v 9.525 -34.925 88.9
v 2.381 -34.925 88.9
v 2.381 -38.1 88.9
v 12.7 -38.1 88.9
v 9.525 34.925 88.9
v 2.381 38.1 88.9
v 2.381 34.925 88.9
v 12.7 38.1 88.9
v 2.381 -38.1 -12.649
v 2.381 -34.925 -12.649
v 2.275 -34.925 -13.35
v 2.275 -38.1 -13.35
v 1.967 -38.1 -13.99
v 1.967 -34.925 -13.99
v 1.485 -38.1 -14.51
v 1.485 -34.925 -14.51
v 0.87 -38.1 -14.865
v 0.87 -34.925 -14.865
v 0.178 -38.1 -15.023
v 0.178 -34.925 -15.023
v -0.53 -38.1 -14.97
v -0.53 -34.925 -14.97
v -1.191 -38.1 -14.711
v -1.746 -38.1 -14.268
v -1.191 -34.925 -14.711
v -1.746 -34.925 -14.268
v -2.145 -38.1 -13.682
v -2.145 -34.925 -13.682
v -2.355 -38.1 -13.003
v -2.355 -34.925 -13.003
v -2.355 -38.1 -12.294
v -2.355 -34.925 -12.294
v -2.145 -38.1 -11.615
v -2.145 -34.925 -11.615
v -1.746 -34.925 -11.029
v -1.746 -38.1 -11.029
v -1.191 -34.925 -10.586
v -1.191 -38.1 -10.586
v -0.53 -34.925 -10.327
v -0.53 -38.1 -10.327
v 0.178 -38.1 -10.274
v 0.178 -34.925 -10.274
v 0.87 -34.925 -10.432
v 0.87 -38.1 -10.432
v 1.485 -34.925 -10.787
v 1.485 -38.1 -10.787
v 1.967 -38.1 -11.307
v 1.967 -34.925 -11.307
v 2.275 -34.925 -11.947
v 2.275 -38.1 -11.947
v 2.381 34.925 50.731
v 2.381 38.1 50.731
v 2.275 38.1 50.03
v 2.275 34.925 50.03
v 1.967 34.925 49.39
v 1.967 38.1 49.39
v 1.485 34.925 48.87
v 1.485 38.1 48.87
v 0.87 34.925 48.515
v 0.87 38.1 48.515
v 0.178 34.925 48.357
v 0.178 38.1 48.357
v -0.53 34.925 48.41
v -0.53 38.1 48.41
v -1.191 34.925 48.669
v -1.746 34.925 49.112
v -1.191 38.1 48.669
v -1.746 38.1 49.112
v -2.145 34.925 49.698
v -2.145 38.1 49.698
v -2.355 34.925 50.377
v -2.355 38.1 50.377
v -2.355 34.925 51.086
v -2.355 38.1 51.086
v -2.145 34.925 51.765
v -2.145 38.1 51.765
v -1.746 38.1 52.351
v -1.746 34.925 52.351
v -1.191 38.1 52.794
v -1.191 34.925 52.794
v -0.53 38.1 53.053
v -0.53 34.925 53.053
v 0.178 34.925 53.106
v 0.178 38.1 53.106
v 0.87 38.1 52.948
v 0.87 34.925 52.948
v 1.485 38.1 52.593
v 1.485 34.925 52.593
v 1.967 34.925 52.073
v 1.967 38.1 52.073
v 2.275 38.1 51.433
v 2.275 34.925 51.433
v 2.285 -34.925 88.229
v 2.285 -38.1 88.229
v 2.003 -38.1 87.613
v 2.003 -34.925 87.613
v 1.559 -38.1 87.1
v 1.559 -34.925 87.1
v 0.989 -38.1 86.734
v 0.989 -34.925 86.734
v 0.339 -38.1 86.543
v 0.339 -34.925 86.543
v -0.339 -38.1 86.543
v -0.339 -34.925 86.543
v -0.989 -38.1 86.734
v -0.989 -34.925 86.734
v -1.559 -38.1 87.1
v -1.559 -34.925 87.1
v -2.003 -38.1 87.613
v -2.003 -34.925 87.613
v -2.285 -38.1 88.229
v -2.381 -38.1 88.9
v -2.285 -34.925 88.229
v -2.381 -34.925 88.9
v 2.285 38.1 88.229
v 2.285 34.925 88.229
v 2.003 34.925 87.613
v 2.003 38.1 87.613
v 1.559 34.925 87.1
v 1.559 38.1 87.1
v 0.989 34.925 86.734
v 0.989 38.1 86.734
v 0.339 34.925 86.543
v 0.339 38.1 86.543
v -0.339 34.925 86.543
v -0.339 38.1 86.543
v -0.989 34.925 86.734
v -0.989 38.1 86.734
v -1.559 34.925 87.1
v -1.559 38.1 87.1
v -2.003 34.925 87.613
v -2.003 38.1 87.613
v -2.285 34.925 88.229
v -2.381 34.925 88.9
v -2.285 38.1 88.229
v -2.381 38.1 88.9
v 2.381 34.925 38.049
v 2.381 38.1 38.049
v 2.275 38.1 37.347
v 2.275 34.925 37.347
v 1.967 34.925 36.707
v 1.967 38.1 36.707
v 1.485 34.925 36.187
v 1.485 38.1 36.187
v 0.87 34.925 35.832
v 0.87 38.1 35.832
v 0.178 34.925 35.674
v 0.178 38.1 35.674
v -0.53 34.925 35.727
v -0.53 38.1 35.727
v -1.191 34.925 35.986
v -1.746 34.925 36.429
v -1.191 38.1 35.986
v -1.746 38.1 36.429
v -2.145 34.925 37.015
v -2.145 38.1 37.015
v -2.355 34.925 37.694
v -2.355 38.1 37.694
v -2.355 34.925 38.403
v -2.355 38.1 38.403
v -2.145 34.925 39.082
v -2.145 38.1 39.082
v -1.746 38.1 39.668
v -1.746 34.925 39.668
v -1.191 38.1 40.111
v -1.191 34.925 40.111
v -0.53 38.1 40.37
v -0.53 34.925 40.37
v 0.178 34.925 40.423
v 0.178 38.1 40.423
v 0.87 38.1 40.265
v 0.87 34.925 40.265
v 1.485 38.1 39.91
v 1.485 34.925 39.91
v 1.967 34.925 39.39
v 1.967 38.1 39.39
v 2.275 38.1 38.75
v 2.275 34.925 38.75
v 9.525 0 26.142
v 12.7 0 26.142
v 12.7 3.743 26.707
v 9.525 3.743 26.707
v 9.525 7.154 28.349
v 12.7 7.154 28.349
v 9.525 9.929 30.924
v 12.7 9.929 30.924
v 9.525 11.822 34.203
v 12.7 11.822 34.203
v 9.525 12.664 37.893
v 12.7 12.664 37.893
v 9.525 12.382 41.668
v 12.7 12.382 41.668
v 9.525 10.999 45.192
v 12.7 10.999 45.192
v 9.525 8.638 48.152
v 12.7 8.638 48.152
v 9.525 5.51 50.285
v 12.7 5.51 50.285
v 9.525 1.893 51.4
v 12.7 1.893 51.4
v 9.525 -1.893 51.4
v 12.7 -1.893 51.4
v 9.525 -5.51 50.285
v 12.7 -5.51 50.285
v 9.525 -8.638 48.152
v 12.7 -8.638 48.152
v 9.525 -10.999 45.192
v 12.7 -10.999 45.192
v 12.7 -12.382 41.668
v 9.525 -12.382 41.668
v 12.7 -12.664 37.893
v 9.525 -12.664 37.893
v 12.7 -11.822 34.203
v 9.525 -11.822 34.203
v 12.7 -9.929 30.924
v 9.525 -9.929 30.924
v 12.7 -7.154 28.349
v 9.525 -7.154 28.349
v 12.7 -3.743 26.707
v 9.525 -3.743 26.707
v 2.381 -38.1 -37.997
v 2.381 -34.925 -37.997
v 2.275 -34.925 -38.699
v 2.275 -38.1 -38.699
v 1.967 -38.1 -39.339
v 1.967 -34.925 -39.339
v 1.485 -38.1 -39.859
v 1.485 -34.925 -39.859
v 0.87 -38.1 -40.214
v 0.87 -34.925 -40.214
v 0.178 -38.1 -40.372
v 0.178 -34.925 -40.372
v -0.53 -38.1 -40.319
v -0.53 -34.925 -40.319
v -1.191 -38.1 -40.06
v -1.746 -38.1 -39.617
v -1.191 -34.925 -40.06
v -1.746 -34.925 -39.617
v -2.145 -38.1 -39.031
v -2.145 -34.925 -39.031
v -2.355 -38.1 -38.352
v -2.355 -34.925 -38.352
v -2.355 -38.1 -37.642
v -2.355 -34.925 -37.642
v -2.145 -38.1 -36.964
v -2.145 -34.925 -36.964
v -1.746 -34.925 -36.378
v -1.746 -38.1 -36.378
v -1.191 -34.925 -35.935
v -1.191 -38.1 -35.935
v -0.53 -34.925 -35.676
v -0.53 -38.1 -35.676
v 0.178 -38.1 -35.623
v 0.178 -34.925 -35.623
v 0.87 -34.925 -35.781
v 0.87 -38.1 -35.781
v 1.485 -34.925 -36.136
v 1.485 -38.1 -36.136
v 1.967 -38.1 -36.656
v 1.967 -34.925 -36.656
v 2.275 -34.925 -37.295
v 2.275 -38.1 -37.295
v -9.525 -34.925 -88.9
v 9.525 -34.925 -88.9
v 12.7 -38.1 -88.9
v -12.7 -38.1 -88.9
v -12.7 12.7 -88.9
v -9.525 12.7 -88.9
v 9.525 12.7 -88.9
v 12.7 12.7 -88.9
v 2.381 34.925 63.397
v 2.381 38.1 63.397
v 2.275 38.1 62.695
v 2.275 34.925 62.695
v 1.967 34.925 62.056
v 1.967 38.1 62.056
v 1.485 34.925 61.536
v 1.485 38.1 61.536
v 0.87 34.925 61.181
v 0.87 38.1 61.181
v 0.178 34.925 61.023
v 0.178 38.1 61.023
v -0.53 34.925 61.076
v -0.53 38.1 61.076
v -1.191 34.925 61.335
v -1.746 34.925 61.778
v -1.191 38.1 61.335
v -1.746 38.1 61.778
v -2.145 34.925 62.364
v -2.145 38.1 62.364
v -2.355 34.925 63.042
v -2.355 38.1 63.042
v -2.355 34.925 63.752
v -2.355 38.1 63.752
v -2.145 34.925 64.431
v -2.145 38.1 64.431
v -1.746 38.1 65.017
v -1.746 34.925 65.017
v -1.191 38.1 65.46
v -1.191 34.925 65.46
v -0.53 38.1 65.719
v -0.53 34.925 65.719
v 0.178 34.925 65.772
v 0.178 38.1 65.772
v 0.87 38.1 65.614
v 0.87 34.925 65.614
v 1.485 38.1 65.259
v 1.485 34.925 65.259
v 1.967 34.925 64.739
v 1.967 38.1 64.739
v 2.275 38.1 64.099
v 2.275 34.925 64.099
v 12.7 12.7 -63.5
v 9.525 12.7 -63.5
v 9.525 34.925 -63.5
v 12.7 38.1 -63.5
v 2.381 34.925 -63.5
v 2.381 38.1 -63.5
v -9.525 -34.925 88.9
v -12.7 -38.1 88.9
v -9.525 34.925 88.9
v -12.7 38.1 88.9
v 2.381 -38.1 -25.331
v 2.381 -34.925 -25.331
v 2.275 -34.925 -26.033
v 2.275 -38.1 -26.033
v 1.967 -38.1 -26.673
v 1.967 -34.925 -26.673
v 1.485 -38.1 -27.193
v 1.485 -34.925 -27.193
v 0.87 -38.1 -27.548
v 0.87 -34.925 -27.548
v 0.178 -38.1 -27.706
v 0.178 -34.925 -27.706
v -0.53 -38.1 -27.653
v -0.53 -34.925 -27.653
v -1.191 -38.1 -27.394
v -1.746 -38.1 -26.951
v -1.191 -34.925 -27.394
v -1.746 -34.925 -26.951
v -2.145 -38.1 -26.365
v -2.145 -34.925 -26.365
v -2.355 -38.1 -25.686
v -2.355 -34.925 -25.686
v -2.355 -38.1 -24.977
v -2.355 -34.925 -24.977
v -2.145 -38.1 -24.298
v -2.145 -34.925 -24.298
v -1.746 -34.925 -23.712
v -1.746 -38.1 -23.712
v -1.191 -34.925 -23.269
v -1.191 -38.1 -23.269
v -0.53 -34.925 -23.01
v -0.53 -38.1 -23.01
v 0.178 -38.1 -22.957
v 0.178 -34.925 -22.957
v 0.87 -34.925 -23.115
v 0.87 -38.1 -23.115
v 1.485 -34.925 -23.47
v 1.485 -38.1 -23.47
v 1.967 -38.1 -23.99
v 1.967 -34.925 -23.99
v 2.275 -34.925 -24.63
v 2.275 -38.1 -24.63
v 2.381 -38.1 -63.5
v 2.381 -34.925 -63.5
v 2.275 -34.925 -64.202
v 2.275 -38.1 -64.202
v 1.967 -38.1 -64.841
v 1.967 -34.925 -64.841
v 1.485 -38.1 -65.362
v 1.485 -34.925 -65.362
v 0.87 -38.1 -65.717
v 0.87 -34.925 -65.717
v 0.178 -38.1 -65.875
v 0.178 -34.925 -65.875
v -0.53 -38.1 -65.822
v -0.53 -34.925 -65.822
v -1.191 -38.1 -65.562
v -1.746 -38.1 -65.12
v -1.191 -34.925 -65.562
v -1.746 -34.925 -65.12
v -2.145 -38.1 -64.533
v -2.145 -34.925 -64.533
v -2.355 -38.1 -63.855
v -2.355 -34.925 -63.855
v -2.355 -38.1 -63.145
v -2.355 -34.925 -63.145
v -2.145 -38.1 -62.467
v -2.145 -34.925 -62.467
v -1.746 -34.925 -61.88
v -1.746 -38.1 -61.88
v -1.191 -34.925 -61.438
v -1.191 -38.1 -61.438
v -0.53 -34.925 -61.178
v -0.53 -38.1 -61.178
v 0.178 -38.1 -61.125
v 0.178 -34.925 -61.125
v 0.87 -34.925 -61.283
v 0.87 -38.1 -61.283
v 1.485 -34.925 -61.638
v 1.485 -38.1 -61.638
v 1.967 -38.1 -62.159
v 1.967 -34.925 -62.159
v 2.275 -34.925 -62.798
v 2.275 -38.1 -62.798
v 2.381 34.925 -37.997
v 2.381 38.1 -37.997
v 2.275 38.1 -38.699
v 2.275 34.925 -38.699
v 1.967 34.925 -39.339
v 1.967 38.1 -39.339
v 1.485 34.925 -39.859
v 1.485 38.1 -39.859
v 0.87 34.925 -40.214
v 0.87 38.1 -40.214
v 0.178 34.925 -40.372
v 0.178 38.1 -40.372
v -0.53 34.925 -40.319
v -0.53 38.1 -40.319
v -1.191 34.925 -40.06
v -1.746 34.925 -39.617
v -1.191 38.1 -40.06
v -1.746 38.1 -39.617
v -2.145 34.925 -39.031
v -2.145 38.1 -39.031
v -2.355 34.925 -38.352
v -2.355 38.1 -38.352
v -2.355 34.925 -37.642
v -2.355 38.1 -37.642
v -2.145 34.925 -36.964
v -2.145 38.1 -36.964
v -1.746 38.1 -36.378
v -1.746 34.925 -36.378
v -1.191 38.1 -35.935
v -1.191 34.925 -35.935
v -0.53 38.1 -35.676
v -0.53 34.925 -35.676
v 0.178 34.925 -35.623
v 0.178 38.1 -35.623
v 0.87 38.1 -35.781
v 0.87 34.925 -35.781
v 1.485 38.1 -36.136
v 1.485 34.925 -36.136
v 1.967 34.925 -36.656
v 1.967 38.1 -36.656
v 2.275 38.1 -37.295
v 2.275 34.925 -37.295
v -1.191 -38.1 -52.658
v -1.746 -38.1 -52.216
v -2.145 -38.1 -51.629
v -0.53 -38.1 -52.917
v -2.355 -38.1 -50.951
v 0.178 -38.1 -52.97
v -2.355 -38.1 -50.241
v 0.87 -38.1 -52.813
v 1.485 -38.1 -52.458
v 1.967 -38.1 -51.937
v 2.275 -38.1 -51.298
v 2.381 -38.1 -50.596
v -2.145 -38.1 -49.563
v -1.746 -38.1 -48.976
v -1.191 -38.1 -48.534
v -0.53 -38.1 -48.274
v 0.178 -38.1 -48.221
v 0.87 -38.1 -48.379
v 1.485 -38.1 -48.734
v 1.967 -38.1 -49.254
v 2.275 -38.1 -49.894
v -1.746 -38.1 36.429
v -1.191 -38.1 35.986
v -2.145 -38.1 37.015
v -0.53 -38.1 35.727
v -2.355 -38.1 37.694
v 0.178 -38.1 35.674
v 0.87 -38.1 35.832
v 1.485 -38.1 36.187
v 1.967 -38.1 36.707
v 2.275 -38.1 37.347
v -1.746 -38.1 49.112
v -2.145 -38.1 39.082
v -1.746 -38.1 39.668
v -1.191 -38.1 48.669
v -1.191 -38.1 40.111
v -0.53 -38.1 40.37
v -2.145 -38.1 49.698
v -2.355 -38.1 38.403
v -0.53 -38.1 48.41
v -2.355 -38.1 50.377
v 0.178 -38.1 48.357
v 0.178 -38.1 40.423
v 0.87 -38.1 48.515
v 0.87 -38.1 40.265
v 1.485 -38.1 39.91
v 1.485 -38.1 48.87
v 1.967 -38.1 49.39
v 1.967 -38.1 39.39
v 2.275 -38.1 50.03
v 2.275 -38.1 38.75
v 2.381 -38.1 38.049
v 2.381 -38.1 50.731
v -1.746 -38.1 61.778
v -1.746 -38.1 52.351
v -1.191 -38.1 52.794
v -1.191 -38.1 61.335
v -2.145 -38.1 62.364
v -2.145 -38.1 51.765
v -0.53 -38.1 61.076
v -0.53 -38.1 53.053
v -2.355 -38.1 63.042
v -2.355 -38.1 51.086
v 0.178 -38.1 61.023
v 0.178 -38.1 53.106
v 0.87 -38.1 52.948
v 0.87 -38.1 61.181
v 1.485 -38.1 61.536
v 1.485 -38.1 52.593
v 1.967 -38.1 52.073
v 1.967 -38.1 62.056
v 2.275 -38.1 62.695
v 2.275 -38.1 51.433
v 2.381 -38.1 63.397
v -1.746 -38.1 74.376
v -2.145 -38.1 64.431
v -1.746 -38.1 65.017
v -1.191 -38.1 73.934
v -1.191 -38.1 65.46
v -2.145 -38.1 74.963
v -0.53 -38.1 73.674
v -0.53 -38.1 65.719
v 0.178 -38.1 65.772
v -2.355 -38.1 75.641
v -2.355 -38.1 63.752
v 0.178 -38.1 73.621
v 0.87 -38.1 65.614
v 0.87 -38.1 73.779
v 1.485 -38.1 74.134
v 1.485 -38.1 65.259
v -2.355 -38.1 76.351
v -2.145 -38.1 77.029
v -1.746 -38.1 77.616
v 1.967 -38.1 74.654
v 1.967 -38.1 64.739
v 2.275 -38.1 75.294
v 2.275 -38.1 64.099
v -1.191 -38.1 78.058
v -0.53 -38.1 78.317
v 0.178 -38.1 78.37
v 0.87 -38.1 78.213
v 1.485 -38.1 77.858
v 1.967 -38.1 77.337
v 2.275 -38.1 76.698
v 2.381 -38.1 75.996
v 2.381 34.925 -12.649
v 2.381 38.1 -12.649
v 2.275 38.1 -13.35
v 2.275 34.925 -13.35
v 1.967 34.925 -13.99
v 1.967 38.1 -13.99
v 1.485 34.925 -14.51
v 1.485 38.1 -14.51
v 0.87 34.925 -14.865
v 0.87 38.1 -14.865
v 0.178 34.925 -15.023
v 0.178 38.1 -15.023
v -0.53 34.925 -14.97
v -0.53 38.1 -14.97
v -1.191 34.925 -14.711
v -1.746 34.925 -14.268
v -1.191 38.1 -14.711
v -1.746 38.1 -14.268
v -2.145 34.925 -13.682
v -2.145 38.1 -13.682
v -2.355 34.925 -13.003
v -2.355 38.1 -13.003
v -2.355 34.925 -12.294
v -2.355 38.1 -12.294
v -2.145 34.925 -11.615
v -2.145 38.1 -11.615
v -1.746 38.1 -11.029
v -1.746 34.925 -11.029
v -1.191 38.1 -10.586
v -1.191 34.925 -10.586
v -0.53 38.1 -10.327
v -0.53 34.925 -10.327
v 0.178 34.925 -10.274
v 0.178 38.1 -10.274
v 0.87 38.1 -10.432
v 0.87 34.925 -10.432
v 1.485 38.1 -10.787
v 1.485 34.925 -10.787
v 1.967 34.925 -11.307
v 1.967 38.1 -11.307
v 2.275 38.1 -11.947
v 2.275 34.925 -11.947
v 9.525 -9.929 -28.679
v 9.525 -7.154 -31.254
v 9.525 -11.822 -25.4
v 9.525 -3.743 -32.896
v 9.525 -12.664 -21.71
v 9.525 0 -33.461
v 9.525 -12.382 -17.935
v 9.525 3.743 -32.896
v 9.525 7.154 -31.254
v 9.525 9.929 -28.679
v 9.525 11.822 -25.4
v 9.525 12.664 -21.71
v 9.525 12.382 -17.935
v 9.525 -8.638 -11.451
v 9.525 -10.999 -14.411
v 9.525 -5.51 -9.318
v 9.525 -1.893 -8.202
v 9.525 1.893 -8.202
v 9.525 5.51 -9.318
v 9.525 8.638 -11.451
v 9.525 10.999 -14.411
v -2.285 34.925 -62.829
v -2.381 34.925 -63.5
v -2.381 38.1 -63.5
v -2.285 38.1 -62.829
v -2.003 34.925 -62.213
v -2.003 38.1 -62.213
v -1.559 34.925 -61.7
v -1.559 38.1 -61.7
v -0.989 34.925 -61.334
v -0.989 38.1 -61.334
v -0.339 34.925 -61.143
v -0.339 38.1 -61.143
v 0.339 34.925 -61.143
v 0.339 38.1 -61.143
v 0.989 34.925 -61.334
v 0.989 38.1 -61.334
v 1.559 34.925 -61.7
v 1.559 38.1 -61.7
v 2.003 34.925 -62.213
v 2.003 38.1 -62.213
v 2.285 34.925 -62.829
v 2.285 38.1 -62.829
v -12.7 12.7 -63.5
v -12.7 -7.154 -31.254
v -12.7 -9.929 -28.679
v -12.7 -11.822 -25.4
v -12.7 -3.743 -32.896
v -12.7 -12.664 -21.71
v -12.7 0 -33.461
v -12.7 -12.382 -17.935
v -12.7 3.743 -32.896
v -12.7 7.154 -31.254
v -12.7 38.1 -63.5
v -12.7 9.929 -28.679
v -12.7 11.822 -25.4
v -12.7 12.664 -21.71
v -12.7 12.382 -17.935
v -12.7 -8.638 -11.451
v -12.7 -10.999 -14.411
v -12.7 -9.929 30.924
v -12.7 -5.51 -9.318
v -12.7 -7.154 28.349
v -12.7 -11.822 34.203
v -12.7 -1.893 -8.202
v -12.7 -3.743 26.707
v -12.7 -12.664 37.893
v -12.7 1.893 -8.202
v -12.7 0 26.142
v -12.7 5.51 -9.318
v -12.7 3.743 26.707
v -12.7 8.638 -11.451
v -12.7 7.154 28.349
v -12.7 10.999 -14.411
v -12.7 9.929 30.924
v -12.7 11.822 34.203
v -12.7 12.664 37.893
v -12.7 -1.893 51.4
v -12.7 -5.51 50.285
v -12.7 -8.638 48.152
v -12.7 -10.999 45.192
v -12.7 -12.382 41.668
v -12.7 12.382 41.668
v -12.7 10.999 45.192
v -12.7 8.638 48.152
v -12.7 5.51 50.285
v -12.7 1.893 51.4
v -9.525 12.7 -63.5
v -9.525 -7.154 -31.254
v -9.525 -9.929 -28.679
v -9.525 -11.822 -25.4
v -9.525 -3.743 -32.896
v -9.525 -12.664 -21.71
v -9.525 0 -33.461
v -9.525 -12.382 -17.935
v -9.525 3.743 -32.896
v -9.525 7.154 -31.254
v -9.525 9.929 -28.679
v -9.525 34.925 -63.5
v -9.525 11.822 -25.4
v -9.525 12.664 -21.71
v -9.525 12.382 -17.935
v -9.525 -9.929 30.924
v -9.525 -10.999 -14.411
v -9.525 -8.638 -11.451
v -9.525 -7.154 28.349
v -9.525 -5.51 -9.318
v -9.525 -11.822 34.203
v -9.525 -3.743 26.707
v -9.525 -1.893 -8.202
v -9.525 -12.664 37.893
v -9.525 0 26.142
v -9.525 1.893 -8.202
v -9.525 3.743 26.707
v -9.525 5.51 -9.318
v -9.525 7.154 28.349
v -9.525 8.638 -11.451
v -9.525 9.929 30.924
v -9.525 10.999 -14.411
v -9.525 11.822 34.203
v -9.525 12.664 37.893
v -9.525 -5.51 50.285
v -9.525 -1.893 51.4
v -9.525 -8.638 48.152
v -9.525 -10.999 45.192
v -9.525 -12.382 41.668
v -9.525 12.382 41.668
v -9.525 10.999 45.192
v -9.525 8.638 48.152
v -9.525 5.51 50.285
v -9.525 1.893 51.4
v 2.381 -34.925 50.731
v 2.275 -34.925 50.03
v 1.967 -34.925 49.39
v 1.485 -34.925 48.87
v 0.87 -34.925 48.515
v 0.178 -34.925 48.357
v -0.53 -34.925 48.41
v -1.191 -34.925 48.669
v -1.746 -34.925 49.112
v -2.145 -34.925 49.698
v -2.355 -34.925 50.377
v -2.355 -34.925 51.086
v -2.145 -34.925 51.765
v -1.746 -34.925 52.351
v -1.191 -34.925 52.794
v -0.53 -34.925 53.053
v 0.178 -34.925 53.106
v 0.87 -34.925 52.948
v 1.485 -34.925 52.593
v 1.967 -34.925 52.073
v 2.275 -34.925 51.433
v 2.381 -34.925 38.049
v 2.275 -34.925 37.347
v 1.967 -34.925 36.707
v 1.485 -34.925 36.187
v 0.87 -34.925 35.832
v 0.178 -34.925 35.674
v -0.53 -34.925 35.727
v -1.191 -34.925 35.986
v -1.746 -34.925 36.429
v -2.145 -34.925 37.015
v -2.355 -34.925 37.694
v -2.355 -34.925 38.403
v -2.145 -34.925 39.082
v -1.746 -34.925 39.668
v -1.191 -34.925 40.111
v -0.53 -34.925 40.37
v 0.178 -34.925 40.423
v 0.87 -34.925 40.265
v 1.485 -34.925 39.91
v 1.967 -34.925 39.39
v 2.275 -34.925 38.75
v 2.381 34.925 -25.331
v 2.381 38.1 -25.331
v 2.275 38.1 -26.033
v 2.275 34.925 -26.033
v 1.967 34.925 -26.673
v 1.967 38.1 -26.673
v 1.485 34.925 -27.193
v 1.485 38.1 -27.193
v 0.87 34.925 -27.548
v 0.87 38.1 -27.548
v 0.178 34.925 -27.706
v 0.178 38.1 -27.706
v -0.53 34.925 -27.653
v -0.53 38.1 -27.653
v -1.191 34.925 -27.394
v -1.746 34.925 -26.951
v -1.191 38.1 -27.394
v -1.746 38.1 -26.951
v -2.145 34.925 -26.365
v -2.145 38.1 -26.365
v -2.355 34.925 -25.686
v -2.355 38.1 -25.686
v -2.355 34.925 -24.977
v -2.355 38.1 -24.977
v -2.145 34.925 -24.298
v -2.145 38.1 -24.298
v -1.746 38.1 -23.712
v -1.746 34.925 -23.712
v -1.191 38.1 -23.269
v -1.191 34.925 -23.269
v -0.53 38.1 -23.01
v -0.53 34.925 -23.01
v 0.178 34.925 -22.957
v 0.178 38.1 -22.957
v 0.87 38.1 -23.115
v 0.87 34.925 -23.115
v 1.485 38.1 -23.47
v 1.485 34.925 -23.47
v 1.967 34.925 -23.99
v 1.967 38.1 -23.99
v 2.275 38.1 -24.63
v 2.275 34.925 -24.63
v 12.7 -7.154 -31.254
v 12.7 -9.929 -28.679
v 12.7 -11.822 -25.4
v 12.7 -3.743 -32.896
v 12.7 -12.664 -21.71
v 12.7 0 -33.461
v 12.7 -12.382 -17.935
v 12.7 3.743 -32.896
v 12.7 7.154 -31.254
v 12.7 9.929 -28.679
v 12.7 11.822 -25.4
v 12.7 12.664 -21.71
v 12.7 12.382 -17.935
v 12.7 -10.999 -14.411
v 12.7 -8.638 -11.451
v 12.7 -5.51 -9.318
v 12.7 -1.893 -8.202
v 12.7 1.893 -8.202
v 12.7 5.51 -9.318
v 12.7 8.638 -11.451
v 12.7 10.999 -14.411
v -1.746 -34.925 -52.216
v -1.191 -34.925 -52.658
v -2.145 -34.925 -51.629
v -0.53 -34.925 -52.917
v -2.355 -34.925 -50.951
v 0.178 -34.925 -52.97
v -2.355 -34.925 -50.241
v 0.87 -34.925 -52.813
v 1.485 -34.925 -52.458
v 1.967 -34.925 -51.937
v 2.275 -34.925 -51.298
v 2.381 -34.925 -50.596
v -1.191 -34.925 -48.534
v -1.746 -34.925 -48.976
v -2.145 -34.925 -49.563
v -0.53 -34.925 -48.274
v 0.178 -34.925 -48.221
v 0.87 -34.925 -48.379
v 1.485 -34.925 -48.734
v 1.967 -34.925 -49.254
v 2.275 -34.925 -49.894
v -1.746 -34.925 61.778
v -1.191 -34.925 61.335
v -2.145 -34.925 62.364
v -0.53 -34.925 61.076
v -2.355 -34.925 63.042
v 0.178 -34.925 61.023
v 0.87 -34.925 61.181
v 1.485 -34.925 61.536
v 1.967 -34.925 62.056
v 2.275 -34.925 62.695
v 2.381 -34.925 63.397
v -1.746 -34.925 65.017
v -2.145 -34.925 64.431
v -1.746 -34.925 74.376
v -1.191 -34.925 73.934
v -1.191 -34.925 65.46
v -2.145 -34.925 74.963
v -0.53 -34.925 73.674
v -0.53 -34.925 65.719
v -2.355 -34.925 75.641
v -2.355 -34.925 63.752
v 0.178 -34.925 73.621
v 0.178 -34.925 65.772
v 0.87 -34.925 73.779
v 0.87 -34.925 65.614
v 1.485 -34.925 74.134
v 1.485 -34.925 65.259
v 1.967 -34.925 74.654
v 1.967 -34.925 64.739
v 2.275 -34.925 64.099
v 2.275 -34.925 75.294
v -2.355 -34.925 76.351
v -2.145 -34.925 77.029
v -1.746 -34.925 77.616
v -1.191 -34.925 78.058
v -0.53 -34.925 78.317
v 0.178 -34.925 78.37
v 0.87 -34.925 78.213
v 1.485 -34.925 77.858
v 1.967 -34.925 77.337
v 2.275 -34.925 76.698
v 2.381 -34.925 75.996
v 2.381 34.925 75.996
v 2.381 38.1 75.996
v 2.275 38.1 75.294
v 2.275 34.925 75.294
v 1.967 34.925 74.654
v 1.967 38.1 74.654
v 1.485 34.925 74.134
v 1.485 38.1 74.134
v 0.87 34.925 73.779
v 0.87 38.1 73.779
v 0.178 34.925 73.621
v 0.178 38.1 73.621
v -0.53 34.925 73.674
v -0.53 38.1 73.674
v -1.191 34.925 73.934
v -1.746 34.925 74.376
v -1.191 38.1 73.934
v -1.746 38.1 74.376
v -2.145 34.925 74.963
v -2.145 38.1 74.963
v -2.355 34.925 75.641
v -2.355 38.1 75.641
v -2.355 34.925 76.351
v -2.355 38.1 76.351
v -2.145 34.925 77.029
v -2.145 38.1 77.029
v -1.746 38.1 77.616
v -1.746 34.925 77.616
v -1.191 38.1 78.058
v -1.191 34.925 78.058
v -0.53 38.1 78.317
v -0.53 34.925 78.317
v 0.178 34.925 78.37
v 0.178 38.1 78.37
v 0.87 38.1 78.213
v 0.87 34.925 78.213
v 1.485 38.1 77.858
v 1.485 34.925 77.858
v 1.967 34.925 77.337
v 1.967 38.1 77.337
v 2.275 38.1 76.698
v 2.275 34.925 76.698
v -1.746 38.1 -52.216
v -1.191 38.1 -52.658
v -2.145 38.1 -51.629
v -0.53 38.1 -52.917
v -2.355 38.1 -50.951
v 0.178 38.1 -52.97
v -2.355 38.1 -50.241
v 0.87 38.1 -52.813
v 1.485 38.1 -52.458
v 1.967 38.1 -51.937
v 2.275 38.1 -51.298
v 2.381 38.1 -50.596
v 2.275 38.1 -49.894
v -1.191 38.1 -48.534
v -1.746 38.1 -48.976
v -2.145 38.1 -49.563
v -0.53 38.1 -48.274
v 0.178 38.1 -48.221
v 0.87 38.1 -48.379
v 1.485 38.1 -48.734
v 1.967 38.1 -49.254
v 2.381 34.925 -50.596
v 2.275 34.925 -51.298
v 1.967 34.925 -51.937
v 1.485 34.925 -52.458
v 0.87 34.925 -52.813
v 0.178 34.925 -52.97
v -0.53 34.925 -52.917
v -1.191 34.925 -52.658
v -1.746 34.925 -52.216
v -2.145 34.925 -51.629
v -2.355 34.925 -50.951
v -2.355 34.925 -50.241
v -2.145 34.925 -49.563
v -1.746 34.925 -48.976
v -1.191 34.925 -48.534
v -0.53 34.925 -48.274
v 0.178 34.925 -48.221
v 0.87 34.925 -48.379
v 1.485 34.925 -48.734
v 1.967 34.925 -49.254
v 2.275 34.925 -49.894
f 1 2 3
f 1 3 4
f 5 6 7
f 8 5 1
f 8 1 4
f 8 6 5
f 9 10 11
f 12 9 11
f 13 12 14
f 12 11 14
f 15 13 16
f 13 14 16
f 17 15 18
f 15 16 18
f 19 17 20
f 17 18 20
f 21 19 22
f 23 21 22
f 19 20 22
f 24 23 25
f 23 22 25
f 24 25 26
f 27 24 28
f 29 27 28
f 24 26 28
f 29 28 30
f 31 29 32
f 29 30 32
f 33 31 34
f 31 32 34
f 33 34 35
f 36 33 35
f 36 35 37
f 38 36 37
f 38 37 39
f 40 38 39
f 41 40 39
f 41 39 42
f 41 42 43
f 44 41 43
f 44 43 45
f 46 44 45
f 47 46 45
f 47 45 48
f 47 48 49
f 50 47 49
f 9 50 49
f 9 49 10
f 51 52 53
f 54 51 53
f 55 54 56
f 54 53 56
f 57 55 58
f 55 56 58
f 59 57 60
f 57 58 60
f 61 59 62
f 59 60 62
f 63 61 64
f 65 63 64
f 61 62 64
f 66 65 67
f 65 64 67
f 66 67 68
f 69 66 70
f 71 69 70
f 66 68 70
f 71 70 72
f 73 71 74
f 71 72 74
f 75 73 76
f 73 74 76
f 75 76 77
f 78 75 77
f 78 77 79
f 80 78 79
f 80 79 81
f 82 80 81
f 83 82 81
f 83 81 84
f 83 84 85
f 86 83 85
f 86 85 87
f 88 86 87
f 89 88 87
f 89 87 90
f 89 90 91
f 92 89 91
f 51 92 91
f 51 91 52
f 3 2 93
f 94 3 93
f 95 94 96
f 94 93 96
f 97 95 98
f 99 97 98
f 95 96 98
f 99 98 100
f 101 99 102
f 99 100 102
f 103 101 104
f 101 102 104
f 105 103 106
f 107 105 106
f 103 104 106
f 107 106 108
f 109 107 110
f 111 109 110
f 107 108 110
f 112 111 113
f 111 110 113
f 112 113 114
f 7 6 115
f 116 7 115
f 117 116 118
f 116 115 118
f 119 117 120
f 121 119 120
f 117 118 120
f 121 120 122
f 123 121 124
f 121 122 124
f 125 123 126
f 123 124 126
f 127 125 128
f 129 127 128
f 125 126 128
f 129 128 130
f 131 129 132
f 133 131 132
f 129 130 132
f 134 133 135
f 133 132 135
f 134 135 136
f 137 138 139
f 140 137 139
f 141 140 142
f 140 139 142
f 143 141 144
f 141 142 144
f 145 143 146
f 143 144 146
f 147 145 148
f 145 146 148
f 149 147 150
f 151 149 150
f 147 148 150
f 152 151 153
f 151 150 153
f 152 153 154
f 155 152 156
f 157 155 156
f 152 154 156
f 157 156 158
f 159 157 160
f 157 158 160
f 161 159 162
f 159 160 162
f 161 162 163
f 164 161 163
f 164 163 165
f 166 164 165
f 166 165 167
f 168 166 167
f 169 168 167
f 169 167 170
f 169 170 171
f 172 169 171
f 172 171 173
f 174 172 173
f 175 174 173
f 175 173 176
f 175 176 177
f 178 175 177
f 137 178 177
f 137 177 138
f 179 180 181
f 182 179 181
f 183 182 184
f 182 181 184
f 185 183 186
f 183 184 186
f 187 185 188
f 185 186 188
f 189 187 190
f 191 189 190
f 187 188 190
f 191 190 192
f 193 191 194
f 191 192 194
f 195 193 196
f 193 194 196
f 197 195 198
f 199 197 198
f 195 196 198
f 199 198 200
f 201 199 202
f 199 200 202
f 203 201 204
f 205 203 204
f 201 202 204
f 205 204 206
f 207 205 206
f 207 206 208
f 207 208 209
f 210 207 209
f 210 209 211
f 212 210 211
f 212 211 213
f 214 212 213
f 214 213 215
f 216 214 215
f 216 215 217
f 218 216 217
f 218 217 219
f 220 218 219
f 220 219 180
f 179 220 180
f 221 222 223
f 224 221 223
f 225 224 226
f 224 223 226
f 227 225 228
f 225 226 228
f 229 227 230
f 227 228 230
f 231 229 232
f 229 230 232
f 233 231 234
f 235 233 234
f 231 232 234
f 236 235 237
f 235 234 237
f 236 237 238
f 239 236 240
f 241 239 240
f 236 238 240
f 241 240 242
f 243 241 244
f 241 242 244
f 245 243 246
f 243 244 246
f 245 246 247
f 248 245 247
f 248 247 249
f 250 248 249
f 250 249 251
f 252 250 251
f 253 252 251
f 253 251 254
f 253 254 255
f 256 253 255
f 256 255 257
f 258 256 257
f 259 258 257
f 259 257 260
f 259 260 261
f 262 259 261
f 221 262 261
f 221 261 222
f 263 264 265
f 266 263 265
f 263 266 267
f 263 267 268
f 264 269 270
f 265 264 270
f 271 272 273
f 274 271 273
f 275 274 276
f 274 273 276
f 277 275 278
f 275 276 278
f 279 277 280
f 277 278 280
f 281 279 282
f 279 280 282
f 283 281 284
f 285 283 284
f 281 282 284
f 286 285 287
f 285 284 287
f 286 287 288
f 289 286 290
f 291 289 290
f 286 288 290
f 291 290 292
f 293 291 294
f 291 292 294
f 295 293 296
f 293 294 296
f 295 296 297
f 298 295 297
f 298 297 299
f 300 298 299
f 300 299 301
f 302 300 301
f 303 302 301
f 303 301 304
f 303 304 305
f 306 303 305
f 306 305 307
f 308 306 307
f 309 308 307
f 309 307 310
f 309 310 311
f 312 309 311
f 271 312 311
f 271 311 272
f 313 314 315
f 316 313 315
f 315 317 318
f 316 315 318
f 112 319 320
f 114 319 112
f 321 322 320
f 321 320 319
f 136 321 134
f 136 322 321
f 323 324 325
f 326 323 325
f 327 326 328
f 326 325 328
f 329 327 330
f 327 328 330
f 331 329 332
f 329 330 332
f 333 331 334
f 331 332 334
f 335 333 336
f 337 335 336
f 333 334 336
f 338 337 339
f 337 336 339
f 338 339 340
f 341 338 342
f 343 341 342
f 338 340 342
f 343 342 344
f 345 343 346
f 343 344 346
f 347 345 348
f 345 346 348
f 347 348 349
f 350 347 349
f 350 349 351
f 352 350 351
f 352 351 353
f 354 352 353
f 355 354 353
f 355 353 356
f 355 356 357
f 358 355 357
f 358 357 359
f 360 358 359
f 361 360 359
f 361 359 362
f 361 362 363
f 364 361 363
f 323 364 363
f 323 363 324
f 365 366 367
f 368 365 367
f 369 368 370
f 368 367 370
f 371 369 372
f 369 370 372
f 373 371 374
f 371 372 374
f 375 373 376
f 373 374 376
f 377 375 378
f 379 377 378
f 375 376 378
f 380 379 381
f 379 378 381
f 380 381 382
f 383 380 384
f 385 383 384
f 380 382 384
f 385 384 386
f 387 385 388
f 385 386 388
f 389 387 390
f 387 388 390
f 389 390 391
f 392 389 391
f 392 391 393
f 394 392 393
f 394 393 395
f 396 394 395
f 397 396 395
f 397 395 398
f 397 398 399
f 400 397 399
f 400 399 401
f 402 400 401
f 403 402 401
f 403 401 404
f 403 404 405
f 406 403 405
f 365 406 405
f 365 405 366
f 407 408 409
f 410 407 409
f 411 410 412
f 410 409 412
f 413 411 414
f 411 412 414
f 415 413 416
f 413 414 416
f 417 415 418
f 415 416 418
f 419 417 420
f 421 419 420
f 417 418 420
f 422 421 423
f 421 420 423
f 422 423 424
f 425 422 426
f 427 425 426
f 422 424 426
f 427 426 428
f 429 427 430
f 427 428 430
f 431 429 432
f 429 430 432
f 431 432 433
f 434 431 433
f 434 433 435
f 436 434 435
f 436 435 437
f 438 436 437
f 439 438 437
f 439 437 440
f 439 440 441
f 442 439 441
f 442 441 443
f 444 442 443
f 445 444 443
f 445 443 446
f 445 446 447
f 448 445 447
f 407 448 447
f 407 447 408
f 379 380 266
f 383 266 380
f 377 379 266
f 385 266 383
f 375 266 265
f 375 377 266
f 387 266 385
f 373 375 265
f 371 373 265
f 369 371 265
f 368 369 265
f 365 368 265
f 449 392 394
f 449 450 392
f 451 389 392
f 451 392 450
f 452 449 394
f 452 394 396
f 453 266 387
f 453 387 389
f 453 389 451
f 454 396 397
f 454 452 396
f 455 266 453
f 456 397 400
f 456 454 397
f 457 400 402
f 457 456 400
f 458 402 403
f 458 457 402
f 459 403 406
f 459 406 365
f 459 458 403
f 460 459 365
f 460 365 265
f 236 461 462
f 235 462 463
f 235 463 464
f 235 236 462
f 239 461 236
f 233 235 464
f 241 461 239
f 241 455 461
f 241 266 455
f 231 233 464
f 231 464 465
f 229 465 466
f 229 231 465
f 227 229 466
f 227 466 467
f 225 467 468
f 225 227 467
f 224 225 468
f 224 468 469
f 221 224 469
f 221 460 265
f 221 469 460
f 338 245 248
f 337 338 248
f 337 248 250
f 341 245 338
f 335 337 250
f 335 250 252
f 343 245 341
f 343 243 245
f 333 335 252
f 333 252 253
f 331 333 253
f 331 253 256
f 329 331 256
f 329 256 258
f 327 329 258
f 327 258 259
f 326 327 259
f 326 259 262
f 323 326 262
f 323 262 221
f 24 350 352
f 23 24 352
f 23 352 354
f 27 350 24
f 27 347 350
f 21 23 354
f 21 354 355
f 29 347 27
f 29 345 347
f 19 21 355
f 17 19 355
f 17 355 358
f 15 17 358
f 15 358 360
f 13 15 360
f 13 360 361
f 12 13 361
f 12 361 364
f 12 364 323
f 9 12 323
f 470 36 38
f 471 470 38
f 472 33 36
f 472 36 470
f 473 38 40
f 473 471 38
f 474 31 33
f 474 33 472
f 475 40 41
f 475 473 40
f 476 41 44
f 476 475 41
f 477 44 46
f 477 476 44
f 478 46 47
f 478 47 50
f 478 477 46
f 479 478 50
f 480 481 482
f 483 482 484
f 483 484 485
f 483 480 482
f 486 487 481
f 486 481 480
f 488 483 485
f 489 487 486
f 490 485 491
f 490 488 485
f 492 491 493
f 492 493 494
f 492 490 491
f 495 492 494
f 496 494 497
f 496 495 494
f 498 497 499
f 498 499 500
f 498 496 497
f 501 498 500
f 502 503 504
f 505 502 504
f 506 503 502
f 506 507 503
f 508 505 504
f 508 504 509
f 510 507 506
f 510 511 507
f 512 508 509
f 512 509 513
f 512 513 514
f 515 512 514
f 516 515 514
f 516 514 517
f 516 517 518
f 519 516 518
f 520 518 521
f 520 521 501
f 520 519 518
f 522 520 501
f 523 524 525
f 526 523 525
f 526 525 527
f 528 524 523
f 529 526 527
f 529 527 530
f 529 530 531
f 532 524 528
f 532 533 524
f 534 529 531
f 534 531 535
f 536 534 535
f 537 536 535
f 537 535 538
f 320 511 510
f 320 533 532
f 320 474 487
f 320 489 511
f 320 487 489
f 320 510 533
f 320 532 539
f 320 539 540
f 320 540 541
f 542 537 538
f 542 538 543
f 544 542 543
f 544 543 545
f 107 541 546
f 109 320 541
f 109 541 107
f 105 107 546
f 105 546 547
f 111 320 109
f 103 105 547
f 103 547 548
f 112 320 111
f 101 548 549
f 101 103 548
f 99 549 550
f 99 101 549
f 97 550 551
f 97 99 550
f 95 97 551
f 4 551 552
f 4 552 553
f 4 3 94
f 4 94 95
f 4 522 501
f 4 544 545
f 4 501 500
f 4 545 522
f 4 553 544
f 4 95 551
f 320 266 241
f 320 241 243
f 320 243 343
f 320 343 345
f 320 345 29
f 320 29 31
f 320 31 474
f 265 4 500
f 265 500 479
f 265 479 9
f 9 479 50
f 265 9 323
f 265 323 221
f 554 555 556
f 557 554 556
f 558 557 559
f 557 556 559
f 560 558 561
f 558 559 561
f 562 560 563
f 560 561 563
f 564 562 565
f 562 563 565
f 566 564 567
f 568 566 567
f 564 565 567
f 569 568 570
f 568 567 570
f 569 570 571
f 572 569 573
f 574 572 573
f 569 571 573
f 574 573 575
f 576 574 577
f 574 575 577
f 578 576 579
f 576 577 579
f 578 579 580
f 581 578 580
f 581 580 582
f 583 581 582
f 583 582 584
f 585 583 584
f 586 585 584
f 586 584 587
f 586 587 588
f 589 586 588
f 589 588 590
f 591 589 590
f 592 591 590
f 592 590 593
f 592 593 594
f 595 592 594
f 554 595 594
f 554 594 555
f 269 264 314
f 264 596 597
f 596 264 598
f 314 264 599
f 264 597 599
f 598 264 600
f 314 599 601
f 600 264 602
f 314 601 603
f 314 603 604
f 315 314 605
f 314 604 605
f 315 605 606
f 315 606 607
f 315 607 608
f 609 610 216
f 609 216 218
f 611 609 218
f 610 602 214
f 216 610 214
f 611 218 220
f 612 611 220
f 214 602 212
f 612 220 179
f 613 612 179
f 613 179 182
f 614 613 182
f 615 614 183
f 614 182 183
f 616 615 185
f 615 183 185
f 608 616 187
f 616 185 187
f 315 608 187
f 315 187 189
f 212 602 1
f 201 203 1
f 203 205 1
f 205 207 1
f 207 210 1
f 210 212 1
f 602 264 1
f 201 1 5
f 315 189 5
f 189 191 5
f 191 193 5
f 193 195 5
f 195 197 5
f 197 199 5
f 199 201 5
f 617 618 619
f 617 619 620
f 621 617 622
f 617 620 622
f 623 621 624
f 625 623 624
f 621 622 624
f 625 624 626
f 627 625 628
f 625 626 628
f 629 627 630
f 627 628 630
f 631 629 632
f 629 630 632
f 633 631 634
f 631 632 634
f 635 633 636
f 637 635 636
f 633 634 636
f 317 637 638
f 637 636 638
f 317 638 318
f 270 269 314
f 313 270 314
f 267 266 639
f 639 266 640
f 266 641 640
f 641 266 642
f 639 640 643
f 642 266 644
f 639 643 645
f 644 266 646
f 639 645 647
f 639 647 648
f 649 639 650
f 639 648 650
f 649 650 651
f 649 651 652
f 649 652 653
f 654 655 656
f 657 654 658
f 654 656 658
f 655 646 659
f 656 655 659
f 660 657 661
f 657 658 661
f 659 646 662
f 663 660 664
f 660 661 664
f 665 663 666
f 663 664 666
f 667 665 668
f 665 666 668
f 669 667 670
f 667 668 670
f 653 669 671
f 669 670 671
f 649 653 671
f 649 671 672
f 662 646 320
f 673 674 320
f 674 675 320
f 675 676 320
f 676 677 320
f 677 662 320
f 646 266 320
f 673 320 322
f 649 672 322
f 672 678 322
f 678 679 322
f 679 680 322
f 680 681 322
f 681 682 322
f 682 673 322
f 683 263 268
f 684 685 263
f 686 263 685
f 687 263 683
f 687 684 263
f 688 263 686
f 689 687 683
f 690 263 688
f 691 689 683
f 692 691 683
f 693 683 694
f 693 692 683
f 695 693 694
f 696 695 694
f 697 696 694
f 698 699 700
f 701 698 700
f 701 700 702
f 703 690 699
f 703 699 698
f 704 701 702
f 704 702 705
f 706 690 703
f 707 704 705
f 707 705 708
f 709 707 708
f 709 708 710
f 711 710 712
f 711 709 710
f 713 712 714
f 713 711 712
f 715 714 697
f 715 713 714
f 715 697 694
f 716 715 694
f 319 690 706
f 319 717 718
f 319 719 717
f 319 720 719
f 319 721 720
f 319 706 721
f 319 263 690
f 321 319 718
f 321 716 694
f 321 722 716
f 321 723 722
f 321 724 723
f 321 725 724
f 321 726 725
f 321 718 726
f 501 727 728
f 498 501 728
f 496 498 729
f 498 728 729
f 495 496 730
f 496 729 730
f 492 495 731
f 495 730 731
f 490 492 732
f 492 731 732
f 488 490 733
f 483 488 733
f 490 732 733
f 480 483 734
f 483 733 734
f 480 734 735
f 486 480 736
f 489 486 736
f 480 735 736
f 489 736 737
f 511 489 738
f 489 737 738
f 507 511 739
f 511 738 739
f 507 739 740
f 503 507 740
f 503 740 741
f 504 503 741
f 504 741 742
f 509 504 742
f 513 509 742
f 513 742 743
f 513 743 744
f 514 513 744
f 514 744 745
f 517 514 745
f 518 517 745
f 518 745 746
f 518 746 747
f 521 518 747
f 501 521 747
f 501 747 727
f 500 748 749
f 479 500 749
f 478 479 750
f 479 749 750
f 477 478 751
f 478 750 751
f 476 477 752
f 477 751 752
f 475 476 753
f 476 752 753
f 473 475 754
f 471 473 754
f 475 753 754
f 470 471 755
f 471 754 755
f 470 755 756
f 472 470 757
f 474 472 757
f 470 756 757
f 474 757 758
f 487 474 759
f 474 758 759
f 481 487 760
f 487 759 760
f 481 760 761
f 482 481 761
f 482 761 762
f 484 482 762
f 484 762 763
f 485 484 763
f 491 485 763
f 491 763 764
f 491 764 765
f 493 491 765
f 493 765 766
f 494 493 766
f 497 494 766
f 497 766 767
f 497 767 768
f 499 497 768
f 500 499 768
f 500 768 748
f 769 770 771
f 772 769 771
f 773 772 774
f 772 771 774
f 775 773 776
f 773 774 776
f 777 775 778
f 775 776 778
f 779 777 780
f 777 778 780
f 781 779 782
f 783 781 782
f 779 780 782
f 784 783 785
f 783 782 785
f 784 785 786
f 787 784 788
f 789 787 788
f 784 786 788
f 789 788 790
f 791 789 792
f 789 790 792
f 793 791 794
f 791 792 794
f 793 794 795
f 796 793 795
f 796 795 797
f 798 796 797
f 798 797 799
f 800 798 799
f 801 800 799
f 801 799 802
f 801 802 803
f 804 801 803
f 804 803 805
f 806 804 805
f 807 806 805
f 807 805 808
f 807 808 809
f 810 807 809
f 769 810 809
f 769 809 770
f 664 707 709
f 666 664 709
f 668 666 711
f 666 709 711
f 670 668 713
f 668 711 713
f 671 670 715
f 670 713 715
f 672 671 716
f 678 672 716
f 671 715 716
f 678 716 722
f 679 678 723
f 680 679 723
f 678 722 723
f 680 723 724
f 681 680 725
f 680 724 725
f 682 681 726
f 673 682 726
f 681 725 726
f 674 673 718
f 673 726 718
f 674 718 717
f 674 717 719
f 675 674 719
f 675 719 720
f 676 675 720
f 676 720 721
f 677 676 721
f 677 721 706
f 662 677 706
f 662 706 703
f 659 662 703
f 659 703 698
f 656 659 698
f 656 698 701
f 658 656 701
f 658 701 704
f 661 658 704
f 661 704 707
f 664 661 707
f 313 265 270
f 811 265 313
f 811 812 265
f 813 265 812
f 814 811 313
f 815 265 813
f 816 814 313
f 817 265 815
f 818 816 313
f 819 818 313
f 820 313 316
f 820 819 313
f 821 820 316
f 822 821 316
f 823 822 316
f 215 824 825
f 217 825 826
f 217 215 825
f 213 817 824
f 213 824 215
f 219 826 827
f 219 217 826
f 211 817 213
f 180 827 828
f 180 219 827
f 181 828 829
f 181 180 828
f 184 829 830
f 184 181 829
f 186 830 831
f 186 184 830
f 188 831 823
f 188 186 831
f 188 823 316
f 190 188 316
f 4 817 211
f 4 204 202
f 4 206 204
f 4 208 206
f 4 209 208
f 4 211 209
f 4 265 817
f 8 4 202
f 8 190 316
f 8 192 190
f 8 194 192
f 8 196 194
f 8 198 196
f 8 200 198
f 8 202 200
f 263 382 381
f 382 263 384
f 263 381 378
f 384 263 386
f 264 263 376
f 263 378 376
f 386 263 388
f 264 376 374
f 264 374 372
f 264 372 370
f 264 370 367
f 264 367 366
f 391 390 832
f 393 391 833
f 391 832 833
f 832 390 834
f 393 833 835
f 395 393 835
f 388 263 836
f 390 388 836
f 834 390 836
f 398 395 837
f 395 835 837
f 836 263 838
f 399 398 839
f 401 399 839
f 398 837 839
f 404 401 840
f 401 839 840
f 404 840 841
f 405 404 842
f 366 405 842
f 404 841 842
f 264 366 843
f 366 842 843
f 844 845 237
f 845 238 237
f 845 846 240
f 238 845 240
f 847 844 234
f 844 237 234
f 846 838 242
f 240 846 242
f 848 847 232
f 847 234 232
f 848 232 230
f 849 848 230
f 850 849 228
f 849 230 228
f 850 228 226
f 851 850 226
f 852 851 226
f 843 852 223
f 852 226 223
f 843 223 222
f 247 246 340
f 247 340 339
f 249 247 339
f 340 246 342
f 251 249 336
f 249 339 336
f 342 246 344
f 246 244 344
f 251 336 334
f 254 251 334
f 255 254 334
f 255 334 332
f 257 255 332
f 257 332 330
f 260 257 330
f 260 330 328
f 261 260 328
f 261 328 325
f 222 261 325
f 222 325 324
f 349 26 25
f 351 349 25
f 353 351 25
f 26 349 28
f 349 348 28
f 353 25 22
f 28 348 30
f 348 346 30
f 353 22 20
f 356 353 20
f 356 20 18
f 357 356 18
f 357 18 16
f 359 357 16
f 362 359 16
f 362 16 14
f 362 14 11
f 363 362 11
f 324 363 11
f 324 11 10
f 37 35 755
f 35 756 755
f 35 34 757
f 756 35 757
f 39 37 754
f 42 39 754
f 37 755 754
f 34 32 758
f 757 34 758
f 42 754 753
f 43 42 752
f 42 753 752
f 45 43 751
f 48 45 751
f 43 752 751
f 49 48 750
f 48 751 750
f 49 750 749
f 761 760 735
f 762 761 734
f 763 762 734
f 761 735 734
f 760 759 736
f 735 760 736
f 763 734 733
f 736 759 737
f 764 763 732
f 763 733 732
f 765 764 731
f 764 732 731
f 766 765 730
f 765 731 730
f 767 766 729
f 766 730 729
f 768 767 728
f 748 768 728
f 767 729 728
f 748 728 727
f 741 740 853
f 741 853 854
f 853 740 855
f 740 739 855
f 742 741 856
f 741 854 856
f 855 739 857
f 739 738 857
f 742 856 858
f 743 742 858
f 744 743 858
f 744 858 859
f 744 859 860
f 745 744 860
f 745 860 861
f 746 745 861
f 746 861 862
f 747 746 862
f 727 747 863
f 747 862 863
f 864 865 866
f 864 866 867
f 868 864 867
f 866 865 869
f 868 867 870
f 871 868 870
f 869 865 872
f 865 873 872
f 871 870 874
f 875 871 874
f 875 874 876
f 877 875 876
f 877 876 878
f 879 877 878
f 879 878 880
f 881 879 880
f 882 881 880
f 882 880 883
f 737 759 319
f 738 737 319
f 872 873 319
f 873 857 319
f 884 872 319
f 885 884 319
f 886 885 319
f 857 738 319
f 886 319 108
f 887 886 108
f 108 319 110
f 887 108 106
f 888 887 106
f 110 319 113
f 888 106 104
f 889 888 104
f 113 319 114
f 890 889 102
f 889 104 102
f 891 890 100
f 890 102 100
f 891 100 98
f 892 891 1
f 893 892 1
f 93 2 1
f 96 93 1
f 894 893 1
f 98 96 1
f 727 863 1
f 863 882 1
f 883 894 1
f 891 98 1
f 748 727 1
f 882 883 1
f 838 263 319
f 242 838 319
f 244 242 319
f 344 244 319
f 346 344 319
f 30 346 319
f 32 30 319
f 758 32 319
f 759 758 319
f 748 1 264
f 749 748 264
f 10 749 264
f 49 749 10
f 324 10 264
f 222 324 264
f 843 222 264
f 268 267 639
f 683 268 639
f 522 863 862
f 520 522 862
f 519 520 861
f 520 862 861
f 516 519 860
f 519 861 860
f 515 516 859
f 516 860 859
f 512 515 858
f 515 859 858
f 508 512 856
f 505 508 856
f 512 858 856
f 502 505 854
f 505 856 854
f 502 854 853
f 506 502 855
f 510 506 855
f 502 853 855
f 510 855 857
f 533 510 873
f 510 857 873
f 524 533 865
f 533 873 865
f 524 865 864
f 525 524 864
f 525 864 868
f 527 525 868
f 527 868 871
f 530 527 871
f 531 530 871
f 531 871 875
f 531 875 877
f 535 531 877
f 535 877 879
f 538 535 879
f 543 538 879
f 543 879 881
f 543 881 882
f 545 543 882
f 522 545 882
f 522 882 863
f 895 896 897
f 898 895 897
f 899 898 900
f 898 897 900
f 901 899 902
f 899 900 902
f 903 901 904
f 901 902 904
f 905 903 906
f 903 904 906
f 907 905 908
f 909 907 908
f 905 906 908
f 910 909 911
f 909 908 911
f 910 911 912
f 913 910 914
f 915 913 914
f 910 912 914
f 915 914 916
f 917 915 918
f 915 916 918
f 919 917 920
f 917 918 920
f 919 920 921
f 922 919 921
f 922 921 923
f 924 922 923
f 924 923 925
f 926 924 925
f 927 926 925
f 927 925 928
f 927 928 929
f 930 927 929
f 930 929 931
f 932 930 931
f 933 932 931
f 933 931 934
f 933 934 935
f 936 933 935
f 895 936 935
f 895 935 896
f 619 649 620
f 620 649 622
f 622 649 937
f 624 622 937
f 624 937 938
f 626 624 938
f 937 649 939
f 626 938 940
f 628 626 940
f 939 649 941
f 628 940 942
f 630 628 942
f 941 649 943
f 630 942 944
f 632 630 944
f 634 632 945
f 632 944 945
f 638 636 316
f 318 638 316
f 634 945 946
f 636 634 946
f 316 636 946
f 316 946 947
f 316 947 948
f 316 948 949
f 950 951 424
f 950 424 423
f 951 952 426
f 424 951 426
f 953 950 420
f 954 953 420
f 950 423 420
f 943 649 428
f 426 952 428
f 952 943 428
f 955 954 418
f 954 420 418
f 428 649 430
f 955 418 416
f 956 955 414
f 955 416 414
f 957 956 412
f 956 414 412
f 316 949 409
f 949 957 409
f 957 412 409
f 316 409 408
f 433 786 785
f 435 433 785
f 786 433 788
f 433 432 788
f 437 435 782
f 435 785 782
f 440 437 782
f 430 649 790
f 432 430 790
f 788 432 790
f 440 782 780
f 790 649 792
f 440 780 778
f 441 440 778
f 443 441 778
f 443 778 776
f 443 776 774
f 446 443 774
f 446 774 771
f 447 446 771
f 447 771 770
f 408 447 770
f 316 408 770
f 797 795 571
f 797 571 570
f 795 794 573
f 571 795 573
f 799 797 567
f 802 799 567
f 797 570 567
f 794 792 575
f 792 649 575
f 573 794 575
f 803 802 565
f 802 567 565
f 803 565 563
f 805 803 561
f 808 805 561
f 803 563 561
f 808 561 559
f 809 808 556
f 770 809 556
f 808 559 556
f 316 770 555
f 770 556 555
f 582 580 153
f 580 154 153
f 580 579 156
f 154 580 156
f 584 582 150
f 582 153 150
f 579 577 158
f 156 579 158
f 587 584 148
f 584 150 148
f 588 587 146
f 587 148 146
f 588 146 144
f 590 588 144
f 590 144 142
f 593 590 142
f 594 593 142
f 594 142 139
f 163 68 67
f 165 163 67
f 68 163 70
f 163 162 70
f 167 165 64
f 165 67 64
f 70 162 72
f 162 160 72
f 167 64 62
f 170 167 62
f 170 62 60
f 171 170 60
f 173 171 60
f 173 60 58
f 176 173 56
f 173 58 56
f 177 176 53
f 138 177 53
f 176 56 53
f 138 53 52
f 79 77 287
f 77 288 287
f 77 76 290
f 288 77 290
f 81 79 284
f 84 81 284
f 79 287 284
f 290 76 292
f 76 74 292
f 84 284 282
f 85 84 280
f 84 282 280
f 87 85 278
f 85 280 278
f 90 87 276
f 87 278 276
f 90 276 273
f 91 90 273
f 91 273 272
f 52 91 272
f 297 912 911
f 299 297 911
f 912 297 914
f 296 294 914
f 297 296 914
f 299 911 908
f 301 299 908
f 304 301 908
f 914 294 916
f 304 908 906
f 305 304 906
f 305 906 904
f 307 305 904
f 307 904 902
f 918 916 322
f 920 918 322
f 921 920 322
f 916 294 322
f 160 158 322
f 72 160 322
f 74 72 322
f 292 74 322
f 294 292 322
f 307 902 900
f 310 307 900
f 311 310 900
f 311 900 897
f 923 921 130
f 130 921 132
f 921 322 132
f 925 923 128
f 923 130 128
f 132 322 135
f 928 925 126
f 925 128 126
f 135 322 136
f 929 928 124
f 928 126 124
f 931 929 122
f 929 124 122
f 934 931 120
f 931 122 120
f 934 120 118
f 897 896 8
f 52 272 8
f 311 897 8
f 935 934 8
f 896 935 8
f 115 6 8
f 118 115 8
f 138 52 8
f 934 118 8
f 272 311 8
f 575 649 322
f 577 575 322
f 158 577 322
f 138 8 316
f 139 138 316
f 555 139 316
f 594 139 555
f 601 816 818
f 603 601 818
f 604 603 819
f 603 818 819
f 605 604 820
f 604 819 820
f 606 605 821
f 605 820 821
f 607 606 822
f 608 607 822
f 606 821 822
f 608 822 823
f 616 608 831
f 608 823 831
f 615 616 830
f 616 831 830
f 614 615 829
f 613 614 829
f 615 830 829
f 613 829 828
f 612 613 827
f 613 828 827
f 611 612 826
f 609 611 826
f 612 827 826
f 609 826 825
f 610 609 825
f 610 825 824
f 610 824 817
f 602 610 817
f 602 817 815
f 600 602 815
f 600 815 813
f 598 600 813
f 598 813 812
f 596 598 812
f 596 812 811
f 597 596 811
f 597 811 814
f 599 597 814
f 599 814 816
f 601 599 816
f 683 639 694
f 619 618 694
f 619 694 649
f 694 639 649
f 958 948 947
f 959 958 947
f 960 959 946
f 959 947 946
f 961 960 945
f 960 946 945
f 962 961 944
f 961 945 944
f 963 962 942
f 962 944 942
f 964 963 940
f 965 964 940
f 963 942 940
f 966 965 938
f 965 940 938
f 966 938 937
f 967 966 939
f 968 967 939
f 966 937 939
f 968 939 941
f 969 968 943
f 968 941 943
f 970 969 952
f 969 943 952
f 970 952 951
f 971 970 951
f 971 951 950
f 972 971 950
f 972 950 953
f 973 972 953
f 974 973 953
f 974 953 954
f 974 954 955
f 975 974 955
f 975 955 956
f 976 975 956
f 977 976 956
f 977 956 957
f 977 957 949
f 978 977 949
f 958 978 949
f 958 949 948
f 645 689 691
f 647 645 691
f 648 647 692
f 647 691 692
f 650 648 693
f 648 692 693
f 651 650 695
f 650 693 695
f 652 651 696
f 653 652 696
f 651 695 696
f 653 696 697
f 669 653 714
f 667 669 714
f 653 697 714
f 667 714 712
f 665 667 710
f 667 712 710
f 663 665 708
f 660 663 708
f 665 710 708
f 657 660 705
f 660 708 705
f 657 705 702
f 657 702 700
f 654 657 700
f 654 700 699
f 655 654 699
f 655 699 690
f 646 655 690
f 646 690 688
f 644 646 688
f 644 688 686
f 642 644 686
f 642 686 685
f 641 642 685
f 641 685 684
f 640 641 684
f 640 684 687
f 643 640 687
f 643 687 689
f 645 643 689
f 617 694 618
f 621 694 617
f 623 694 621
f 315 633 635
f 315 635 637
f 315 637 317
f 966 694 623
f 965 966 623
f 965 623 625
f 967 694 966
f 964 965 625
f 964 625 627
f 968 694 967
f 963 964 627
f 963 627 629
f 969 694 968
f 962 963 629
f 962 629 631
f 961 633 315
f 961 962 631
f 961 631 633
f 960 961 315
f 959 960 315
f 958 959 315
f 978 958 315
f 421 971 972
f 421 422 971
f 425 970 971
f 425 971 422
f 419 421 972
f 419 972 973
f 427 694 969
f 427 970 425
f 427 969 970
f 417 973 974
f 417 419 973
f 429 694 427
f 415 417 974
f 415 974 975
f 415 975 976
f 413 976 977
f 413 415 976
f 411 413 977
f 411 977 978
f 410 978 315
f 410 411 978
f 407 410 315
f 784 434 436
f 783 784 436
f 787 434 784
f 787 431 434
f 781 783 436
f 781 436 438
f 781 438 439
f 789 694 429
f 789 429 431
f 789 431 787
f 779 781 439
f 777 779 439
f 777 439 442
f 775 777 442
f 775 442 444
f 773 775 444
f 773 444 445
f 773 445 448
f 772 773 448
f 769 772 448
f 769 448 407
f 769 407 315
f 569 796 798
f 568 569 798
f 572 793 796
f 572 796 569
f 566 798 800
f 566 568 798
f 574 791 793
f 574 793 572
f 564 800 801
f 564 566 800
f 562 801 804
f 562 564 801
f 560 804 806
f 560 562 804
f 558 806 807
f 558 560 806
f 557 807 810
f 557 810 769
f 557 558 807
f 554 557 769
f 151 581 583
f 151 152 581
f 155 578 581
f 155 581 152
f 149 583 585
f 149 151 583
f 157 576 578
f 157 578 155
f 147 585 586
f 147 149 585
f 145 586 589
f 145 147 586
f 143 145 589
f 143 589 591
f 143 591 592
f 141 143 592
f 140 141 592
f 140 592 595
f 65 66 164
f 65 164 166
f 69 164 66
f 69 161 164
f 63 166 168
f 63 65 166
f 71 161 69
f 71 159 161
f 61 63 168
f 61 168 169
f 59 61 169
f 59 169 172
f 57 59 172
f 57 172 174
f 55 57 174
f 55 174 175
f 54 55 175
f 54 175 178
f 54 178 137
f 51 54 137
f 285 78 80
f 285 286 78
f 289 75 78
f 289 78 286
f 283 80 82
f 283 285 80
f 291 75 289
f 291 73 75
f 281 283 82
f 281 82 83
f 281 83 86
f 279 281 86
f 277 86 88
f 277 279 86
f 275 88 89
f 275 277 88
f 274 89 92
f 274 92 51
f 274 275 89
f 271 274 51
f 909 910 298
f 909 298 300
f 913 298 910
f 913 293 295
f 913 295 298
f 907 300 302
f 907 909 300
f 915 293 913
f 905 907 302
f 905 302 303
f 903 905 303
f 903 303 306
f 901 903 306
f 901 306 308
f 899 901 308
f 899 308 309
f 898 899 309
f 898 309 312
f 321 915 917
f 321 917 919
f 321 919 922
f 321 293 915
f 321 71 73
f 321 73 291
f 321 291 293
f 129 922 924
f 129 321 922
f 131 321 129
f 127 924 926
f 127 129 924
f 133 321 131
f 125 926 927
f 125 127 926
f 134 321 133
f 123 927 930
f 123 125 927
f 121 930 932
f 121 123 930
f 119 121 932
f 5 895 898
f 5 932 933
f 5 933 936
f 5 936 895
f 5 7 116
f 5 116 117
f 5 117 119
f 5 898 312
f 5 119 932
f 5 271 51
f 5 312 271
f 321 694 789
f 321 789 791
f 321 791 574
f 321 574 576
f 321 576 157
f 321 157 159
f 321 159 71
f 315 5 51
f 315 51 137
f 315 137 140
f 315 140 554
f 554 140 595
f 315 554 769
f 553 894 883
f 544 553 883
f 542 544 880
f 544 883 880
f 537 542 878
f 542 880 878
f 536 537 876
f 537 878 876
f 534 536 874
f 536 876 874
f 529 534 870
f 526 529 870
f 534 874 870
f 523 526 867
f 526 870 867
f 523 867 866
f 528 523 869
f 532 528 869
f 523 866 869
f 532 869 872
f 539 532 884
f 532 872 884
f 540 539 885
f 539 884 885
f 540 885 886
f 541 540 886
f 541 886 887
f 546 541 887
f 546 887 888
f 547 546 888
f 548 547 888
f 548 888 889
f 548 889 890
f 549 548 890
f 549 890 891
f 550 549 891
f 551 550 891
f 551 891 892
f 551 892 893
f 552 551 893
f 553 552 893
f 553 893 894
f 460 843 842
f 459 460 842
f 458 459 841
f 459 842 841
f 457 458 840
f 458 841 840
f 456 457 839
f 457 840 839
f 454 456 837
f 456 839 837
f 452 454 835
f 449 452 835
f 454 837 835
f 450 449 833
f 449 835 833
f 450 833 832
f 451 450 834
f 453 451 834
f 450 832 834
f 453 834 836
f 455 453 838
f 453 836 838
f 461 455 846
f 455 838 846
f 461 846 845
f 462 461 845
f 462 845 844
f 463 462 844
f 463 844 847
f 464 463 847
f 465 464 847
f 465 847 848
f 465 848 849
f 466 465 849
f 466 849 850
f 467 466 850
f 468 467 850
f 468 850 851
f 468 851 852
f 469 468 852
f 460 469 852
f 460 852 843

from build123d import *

# Parameters (mm, degrees)
SKETCH1_W           = 25.4
SKETCH1_H           = 76.2
BOSS_EXTRUDE1_DEPTH = 88.9
SHELL1_T            = -3.175
SKETCH2_W           = 25.4
SKETCH2_H           = 25.4
CUT_EXTRUDE1_DEPTH  = 26.4
SKETCH3_R           = 2.38125
CUT_EXTRUDE2_DEPTH  = 77.2
SKETCH5_R           = 12.7
CUT_EXTRUDE3_DEPTH  = 26.4


with BuildPart() as part:
    # Sketch1 → Boss-Extrude1 (new body, symmetric)
    with BuildSketch(Plane.XY):
        Rectangle(SKETCH1_W, SKETCH1_H)
    extrude(amount=BOSS_EXTRUDE1_DEPTH, both=True)

    # Shell1
    shell1_openings = [part.faces().sort_by_distance(p)[0] for p in [
        (0, 0, 88.9),
        (0, 0, -88.9),
    ]]
    offset(amount=SHELL1_T, openings=shell1_openings, kind=Kind.INTERSECTION)

    # Sketch2 → Cut-Extrude1 (cut, through all)
    with BuildSketch(Plane.ZY.offset(12.7)):
        with Locations((-76.2, 25.4)):
            Rectangle(SKETCH2_W, SKETCH2_H)
    extrude(amount=-CUT_EXTRUDE1_DEPTH, mode=Mode.SUBTRACT)

    # Sketch3 → Cut-Extrude2 (cut, through all)
    with BuildSketch(Plane(origin=(0, 38.1, 0), x_dir=(1, 0, 0), z_dir=(0, 1, 0))):
        with Locations((0, -88.9)):
            Circle(SKETCH3_R)
        with Locations((0, -75.995900078)):
            Circle(SKETCH3_R)
        with Locations((0, -63.397337518)):
            Circle(SKETCH3_R)
        with Locations((0, -50.731481722)):
            Circle(SKETCH3_R)
        with Locations((0, -38.048590908)):
            Circle(SKETCH3_R)
        with Locations((0, 63.5)):
            Circle(SKETCH3_R)
        with Locations((0, 12.648590908)):
            Circle(SKETCH3_R)
        with Locations((0, 25.331481722)):
            Circle(SKETCH3_R)
        with Locations((0, 37.997337518)):
            Circle(SKETCH3_R)
        with Locations((0, 50.595900078)):
            Circle(SKETCH3_R)
    extrude(amount=-CUT_EXTRUDE2_DEPTH, mode=Mode.SUBTRACT)

    # Sketch5 → Cut-Extrude3 (cut, through all)
    with BuildSketch(Plane(origin=(12.7, 0, 0), x_dir=(0, 0, -1), z_dir=(1, 0, 0))):
        with Locations((20.760556689, 0)):
            Circle(SKETCH5_R)
        with Locations((-38.84233187, 0)):
            Circle(SKETCH5_R)
    extrude(amount=-CUT_EXTRUDE3_DEPTH, mode=Mode.SUBTRACT)


solid = part.part
